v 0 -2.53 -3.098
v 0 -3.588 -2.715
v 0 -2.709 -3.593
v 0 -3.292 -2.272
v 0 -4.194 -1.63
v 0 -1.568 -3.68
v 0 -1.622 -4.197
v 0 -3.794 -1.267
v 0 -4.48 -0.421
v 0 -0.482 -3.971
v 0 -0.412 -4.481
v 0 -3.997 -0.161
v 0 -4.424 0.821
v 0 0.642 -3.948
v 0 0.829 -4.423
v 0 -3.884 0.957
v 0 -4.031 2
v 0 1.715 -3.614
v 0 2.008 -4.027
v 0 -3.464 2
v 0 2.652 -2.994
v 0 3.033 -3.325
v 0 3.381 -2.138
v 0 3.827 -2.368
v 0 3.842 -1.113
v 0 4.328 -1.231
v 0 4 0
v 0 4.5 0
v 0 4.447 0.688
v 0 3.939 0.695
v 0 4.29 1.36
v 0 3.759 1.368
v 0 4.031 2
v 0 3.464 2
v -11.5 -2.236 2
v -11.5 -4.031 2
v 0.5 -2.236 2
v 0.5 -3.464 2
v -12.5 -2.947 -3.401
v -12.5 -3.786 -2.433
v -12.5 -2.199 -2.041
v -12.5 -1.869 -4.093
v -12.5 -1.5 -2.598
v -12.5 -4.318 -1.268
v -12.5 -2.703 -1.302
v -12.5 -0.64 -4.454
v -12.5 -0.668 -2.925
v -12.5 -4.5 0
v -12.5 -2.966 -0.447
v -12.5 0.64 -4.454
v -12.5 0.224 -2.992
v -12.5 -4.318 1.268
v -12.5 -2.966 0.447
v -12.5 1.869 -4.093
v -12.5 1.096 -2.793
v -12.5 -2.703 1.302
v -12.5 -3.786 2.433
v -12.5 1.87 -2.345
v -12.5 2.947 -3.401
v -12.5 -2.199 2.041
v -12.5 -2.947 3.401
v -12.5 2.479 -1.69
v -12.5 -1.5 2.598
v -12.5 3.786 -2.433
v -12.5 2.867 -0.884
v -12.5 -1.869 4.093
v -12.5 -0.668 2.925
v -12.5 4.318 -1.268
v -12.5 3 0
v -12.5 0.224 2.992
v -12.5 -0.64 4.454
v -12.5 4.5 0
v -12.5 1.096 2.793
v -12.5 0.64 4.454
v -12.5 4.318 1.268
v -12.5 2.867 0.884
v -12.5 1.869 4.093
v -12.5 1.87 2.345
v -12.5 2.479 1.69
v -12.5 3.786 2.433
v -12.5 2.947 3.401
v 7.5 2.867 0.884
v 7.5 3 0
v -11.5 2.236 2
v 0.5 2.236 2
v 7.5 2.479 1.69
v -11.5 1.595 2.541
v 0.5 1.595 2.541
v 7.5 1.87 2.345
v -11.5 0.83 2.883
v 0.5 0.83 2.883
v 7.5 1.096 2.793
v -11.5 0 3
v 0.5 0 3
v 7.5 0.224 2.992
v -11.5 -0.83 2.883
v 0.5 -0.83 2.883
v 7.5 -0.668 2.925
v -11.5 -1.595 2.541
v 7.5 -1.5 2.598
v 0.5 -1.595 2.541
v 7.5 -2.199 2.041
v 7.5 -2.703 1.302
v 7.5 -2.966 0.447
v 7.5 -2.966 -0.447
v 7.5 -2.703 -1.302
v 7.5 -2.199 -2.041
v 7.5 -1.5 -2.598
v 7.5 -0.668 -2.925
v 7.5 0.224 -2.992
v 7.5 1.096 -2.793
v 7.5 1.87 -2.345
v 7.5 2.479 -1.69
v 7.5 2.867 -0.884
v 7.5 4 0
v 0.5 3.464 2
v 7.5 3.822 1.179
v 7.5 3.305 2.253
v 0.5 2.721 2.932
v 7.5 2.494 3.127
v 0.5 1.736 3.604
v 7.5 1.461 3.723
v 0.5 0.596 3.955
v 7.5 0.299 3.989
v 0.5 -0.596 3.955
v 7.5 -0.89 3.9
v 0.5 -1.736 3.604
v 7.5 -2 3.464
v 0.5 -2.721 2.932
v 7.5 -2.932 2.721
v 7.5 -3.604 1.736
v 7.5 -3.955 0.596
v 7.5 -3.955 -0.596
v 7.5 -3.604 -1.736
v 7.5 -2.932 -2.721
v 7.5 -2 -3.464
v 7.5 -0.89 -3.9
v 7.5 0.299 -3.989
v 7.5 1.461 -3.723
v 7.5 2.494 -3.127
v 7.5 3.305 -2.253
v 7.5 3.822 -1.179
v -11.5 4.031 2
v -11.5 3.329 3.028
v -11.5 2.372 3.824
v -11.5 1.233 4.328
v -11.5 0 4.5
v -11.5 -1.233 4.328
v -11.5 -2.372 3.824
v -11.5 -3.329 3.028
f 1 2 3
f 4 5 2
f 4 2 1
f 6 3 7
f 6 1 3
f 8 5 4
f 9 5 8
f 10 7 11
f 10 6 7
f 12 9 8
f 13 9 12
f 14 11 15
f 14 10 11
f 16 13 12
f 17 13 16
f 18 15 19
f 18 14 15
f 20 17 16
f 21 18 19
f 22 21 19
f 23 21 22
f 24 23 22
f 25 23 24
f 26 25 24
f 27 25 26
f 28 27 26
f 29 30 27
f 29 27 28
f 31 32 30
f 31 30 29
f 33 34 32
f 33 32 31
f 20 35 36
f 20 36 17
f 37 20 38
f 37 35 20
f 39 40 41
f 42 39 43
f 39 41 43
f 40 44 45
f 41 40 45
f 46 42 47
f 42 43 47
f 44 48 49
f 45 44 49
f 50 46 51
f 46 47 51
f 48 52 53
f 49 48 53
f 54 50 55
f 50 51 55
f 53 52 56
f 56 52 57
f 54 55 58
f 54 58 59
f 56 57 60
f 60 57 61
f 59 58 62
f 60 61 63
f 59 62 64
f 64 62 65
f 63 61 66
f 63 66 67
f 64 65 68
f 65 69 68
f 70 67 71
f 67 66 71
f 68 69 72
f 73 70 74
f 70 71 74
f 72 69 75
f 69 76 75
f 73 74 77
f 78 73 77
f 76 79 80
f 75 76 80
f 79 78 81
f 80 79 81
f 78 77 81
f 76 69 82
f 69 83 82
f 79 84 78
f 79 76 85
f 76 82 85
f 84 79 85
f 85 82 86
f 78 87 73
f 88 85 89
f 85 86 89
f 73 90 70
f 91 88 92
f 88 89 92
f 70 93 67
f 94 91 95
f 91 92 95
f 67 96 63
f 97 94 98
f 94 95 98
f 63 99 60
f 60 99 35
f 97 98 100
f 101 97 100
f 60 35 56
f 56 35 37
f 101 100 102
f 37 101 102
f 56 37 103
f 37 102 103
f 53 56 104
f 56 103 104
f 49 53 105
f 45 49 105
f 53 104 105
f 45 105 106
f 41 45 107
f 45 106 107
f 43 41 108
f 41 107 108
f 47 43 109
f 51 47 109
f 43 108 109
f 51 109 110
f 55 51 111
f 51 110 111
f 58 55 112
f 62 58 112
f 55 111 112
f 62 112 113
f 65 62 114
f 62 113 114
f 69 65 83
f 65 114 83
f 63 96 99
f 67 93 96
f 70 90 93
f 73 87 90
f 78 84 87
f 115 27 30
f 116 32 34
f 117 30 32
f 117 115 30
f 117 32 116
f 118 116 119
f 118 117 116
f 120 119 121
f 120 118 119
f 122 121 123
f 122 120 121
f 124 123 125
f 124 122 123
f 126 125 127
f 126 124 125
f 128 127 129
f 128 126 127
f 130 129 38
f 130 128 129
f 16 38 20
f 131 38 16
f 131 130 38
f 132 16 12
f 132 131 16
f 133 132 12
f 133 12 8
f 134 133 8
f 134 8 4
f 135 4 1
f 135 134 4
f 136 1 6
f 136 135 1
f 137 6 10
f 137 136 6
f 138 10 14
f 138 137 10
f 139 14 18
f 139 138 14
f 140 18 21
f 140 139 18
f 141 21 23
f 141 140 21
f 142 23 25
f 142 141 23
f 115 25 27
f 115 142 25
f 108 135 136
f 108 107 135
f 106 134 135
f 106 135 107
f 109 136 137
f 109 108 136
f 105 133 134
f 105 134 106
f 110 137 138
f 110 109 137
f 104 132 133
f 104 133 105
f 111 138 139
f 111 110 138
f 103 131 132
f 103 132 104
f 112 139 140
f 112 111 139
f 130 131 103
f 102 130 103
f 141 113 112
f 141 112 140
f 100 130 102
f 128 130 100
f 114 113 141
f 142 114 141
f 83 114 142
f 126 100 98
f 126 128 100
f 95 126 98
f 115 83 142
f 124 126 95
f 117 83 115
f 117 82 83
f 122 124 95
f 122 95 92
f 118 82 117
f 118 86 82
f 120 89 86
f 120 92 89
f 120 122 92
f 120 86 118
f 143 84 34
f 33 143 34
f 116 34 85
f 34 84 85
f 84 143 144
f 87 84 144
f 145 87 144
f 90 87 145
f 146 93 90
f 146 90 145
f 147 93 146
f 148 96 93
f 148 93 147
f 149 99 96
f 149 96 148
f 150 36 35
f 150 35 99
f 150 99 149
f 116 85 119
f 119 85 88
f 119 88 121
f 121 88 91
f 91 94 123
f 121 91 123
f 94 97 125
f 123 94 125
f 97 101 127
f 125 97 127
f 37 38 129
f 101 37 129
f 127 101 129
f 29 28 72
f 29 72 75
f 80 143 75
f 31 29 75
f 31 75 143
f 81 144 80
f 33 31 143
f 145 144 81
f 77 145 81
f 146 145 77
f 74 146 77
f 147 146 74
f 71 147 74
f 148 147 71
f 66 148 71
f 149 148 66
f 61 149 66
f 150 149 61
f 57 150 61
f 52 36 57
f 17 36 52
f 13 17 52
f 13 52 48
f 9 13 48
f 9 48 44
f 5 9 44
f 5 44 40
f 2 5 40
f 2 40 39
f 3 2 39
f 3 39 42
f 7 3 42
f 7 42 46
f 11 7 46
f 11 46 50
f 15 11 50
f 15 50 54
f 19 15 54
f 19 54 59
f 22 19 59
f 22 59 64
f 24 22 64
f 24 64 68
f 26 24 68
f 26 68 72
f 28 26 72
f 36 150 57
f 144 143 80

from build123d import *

# Parameters (mm, degrees)
F0_R          = 4
F0_R_2        = 3
F1_DEPTH      = 7.5
F1_DEPTH_BACK = 12.5
F0_R_3        = 4.5
F2_DEPTH      = 12.5
F3_W          = 12
F3_H          = 9.086956
F4_DEPTH      = 25
F4_DEPTH_BACK = 25


with BuildPart() as f1:
    # F0 (on Right) → F1 (new body, two sides)
    with BuildSketch(Plane.YZ) as f1_sk:
        Circle(F0_R)
        Circle(F0_R_2, mode=Mode.SUBTRACT)
    extrude(amount=F1_DEPTH)
    extrude(f1_sk.sketch, amount=-F1_DEPTH_BACK)

    # F0 (on Right) → F2 (join)
    with BuildSketch(Plane.YZ):
        Circle(F0_R_3)
        Circle(F0_R, mode=Mode.SUBTRACT)
    extrude(amount=-F2_DEPTH)

    # F3 (on Front) → F4 (cut, two sides)
    with BuildSketch(Plane.XZ) as f4_sk:
        with Locations((-5.5, 6.543478)):
            Rectangle(F3_W, F3_H)
    extrude(amount=F4_DEPTH, mode=Mode.SUBTRACT)
    extrude(f4_sk.sketch, amount=-F4_DEPTH_BACK, mode=Mode.SUBTRACT)


solid = f1.part
